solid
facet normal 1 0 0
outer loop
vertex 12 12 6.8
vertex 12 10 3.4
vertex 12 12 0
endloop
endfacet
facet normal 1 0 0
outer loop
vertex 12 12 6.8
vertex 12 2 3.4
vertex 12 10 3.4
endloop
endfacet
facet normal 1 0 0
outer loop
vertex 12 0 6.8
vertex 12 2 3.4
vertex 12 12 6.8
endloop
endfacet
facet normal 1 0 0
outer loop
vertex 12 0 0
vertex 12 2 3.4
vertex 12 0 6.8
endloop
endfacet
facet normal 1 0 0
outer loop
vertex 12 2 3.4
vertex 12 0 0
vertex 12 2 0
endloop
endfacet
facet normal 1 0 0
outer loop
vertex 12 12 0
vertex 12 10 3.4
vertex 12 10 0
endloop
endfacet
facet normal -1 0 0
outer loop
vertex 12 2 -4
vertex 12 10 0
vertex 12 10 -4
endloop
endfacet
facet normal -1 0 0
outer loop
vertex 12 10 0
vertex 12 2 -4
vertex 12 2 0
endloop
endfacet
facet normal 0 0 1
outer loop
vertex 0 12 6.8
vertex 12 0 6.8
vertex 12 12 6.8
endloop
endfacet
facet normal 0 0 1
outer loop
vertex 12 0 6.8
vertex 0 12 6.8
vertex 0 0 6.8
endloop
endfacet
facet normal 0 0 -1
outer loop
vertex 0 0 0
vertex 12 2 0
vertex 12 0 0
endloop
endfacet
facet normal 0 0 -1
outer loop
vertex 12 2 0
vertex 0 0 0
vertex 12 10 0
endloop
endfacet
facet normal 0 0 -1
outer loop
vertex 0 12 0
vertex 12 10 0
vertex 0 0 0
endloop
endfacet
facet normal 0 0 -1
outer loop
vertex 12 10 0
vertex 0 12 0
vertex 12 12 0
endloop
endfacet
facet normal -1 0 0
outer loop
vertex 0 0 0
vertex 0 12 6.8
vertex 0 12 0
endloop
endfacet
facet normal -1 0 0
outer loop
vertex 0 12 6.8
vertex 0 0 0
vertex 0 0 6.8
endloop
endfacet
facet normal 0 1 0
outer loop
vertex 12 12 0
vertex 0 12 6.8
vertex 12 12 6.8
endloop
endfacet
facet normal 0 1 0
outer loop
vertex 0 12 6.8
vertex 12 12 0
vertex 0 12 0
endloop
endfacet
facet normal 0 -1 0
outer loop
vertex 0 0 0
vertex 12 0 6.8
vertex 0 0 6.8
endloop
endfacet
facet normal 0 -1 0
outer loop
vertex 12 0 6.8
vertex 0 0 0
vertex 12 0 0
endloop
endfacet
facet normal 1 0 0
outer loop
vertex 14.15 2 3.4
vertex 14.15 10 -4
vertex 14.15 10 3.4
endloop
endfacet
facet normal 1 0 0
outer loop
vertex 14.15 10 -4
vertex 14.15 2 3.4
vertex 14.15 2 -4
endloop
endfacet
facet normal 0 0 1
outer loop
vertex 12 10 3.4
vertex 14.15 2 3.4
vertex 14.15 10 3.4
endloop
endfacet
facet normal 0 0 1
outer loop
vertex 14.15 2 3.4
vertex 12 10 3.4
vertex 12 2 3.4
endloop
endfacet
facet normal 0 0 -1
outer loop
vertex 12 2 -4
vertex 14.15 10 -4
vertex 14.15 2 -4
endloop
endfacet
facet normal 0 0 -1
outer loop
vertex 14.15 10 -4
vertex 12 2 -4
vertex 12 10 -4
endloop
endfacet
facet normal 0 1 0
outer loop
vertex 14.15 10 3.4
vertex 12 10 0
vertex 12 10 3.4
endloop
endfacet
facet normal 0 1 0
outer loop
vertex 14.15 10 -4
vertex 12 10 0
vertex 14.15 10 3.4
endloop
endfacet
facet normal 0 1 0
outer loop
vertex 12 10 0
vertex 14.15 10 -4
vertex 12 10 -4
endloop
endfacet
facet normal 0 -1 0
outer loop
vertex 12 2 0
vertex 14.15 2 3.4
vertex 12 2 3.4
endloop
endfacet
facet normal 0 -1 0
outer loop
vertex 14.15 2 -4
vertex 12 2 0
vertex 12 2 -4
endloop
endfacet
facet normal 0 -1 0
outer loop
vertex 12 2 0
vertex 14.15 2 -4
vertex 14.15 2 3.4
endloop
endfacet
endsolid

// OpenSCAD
// file: ../adafruit-on-off-button-1683.scad
/**
 * This is a model of the on/off toggle button from Adafruit.
 *
 *      https://www.adafruit.com/product/1683
 */

 module adafruitOnOffButton1683()
 {
    xLength = adafruitOnOffButton1683_xyLength();
    yLength = adafruitOnOffButton1683_xyLength();
    zLength = adafruitOnOffButton1683_zLength();

    union()
    {
        color("black")
        cube([xLength, yLength, zLength]);

        adafruitOnOffButton1683_pins();
    }
 }

/** Support functions and modules follow. **/

function adafruitOnOffButton1683_xyLength() = 12;

function adafruitOnOffButton1683_zLength() = 6.8;

module adafruitOnOffButton1683_pins()
{
    // This arithmetic is from the dimensions given on the Adafuit product pate.
    xLength = (7.9 + 0.25) - 6; // subtract half the xLength

    yLength = 8;

    zLength = (6.8 / 2.0) + 4;

    xTranslate = adafruitOnOffButton1683_xyLength();
    yTranslate = (adafruitOnOffButton1683_xyLength() - yLength) / 2.0;
    zTranslate = -4;

    color("yellow")
    translate([xTranslate, yTranslate, zTranslate])
    cube([xLength, yLength, zLength]);
}
// main file
use <../adafruit-on-off-button-1683.scad>

adafruitOnOffButton1683();
